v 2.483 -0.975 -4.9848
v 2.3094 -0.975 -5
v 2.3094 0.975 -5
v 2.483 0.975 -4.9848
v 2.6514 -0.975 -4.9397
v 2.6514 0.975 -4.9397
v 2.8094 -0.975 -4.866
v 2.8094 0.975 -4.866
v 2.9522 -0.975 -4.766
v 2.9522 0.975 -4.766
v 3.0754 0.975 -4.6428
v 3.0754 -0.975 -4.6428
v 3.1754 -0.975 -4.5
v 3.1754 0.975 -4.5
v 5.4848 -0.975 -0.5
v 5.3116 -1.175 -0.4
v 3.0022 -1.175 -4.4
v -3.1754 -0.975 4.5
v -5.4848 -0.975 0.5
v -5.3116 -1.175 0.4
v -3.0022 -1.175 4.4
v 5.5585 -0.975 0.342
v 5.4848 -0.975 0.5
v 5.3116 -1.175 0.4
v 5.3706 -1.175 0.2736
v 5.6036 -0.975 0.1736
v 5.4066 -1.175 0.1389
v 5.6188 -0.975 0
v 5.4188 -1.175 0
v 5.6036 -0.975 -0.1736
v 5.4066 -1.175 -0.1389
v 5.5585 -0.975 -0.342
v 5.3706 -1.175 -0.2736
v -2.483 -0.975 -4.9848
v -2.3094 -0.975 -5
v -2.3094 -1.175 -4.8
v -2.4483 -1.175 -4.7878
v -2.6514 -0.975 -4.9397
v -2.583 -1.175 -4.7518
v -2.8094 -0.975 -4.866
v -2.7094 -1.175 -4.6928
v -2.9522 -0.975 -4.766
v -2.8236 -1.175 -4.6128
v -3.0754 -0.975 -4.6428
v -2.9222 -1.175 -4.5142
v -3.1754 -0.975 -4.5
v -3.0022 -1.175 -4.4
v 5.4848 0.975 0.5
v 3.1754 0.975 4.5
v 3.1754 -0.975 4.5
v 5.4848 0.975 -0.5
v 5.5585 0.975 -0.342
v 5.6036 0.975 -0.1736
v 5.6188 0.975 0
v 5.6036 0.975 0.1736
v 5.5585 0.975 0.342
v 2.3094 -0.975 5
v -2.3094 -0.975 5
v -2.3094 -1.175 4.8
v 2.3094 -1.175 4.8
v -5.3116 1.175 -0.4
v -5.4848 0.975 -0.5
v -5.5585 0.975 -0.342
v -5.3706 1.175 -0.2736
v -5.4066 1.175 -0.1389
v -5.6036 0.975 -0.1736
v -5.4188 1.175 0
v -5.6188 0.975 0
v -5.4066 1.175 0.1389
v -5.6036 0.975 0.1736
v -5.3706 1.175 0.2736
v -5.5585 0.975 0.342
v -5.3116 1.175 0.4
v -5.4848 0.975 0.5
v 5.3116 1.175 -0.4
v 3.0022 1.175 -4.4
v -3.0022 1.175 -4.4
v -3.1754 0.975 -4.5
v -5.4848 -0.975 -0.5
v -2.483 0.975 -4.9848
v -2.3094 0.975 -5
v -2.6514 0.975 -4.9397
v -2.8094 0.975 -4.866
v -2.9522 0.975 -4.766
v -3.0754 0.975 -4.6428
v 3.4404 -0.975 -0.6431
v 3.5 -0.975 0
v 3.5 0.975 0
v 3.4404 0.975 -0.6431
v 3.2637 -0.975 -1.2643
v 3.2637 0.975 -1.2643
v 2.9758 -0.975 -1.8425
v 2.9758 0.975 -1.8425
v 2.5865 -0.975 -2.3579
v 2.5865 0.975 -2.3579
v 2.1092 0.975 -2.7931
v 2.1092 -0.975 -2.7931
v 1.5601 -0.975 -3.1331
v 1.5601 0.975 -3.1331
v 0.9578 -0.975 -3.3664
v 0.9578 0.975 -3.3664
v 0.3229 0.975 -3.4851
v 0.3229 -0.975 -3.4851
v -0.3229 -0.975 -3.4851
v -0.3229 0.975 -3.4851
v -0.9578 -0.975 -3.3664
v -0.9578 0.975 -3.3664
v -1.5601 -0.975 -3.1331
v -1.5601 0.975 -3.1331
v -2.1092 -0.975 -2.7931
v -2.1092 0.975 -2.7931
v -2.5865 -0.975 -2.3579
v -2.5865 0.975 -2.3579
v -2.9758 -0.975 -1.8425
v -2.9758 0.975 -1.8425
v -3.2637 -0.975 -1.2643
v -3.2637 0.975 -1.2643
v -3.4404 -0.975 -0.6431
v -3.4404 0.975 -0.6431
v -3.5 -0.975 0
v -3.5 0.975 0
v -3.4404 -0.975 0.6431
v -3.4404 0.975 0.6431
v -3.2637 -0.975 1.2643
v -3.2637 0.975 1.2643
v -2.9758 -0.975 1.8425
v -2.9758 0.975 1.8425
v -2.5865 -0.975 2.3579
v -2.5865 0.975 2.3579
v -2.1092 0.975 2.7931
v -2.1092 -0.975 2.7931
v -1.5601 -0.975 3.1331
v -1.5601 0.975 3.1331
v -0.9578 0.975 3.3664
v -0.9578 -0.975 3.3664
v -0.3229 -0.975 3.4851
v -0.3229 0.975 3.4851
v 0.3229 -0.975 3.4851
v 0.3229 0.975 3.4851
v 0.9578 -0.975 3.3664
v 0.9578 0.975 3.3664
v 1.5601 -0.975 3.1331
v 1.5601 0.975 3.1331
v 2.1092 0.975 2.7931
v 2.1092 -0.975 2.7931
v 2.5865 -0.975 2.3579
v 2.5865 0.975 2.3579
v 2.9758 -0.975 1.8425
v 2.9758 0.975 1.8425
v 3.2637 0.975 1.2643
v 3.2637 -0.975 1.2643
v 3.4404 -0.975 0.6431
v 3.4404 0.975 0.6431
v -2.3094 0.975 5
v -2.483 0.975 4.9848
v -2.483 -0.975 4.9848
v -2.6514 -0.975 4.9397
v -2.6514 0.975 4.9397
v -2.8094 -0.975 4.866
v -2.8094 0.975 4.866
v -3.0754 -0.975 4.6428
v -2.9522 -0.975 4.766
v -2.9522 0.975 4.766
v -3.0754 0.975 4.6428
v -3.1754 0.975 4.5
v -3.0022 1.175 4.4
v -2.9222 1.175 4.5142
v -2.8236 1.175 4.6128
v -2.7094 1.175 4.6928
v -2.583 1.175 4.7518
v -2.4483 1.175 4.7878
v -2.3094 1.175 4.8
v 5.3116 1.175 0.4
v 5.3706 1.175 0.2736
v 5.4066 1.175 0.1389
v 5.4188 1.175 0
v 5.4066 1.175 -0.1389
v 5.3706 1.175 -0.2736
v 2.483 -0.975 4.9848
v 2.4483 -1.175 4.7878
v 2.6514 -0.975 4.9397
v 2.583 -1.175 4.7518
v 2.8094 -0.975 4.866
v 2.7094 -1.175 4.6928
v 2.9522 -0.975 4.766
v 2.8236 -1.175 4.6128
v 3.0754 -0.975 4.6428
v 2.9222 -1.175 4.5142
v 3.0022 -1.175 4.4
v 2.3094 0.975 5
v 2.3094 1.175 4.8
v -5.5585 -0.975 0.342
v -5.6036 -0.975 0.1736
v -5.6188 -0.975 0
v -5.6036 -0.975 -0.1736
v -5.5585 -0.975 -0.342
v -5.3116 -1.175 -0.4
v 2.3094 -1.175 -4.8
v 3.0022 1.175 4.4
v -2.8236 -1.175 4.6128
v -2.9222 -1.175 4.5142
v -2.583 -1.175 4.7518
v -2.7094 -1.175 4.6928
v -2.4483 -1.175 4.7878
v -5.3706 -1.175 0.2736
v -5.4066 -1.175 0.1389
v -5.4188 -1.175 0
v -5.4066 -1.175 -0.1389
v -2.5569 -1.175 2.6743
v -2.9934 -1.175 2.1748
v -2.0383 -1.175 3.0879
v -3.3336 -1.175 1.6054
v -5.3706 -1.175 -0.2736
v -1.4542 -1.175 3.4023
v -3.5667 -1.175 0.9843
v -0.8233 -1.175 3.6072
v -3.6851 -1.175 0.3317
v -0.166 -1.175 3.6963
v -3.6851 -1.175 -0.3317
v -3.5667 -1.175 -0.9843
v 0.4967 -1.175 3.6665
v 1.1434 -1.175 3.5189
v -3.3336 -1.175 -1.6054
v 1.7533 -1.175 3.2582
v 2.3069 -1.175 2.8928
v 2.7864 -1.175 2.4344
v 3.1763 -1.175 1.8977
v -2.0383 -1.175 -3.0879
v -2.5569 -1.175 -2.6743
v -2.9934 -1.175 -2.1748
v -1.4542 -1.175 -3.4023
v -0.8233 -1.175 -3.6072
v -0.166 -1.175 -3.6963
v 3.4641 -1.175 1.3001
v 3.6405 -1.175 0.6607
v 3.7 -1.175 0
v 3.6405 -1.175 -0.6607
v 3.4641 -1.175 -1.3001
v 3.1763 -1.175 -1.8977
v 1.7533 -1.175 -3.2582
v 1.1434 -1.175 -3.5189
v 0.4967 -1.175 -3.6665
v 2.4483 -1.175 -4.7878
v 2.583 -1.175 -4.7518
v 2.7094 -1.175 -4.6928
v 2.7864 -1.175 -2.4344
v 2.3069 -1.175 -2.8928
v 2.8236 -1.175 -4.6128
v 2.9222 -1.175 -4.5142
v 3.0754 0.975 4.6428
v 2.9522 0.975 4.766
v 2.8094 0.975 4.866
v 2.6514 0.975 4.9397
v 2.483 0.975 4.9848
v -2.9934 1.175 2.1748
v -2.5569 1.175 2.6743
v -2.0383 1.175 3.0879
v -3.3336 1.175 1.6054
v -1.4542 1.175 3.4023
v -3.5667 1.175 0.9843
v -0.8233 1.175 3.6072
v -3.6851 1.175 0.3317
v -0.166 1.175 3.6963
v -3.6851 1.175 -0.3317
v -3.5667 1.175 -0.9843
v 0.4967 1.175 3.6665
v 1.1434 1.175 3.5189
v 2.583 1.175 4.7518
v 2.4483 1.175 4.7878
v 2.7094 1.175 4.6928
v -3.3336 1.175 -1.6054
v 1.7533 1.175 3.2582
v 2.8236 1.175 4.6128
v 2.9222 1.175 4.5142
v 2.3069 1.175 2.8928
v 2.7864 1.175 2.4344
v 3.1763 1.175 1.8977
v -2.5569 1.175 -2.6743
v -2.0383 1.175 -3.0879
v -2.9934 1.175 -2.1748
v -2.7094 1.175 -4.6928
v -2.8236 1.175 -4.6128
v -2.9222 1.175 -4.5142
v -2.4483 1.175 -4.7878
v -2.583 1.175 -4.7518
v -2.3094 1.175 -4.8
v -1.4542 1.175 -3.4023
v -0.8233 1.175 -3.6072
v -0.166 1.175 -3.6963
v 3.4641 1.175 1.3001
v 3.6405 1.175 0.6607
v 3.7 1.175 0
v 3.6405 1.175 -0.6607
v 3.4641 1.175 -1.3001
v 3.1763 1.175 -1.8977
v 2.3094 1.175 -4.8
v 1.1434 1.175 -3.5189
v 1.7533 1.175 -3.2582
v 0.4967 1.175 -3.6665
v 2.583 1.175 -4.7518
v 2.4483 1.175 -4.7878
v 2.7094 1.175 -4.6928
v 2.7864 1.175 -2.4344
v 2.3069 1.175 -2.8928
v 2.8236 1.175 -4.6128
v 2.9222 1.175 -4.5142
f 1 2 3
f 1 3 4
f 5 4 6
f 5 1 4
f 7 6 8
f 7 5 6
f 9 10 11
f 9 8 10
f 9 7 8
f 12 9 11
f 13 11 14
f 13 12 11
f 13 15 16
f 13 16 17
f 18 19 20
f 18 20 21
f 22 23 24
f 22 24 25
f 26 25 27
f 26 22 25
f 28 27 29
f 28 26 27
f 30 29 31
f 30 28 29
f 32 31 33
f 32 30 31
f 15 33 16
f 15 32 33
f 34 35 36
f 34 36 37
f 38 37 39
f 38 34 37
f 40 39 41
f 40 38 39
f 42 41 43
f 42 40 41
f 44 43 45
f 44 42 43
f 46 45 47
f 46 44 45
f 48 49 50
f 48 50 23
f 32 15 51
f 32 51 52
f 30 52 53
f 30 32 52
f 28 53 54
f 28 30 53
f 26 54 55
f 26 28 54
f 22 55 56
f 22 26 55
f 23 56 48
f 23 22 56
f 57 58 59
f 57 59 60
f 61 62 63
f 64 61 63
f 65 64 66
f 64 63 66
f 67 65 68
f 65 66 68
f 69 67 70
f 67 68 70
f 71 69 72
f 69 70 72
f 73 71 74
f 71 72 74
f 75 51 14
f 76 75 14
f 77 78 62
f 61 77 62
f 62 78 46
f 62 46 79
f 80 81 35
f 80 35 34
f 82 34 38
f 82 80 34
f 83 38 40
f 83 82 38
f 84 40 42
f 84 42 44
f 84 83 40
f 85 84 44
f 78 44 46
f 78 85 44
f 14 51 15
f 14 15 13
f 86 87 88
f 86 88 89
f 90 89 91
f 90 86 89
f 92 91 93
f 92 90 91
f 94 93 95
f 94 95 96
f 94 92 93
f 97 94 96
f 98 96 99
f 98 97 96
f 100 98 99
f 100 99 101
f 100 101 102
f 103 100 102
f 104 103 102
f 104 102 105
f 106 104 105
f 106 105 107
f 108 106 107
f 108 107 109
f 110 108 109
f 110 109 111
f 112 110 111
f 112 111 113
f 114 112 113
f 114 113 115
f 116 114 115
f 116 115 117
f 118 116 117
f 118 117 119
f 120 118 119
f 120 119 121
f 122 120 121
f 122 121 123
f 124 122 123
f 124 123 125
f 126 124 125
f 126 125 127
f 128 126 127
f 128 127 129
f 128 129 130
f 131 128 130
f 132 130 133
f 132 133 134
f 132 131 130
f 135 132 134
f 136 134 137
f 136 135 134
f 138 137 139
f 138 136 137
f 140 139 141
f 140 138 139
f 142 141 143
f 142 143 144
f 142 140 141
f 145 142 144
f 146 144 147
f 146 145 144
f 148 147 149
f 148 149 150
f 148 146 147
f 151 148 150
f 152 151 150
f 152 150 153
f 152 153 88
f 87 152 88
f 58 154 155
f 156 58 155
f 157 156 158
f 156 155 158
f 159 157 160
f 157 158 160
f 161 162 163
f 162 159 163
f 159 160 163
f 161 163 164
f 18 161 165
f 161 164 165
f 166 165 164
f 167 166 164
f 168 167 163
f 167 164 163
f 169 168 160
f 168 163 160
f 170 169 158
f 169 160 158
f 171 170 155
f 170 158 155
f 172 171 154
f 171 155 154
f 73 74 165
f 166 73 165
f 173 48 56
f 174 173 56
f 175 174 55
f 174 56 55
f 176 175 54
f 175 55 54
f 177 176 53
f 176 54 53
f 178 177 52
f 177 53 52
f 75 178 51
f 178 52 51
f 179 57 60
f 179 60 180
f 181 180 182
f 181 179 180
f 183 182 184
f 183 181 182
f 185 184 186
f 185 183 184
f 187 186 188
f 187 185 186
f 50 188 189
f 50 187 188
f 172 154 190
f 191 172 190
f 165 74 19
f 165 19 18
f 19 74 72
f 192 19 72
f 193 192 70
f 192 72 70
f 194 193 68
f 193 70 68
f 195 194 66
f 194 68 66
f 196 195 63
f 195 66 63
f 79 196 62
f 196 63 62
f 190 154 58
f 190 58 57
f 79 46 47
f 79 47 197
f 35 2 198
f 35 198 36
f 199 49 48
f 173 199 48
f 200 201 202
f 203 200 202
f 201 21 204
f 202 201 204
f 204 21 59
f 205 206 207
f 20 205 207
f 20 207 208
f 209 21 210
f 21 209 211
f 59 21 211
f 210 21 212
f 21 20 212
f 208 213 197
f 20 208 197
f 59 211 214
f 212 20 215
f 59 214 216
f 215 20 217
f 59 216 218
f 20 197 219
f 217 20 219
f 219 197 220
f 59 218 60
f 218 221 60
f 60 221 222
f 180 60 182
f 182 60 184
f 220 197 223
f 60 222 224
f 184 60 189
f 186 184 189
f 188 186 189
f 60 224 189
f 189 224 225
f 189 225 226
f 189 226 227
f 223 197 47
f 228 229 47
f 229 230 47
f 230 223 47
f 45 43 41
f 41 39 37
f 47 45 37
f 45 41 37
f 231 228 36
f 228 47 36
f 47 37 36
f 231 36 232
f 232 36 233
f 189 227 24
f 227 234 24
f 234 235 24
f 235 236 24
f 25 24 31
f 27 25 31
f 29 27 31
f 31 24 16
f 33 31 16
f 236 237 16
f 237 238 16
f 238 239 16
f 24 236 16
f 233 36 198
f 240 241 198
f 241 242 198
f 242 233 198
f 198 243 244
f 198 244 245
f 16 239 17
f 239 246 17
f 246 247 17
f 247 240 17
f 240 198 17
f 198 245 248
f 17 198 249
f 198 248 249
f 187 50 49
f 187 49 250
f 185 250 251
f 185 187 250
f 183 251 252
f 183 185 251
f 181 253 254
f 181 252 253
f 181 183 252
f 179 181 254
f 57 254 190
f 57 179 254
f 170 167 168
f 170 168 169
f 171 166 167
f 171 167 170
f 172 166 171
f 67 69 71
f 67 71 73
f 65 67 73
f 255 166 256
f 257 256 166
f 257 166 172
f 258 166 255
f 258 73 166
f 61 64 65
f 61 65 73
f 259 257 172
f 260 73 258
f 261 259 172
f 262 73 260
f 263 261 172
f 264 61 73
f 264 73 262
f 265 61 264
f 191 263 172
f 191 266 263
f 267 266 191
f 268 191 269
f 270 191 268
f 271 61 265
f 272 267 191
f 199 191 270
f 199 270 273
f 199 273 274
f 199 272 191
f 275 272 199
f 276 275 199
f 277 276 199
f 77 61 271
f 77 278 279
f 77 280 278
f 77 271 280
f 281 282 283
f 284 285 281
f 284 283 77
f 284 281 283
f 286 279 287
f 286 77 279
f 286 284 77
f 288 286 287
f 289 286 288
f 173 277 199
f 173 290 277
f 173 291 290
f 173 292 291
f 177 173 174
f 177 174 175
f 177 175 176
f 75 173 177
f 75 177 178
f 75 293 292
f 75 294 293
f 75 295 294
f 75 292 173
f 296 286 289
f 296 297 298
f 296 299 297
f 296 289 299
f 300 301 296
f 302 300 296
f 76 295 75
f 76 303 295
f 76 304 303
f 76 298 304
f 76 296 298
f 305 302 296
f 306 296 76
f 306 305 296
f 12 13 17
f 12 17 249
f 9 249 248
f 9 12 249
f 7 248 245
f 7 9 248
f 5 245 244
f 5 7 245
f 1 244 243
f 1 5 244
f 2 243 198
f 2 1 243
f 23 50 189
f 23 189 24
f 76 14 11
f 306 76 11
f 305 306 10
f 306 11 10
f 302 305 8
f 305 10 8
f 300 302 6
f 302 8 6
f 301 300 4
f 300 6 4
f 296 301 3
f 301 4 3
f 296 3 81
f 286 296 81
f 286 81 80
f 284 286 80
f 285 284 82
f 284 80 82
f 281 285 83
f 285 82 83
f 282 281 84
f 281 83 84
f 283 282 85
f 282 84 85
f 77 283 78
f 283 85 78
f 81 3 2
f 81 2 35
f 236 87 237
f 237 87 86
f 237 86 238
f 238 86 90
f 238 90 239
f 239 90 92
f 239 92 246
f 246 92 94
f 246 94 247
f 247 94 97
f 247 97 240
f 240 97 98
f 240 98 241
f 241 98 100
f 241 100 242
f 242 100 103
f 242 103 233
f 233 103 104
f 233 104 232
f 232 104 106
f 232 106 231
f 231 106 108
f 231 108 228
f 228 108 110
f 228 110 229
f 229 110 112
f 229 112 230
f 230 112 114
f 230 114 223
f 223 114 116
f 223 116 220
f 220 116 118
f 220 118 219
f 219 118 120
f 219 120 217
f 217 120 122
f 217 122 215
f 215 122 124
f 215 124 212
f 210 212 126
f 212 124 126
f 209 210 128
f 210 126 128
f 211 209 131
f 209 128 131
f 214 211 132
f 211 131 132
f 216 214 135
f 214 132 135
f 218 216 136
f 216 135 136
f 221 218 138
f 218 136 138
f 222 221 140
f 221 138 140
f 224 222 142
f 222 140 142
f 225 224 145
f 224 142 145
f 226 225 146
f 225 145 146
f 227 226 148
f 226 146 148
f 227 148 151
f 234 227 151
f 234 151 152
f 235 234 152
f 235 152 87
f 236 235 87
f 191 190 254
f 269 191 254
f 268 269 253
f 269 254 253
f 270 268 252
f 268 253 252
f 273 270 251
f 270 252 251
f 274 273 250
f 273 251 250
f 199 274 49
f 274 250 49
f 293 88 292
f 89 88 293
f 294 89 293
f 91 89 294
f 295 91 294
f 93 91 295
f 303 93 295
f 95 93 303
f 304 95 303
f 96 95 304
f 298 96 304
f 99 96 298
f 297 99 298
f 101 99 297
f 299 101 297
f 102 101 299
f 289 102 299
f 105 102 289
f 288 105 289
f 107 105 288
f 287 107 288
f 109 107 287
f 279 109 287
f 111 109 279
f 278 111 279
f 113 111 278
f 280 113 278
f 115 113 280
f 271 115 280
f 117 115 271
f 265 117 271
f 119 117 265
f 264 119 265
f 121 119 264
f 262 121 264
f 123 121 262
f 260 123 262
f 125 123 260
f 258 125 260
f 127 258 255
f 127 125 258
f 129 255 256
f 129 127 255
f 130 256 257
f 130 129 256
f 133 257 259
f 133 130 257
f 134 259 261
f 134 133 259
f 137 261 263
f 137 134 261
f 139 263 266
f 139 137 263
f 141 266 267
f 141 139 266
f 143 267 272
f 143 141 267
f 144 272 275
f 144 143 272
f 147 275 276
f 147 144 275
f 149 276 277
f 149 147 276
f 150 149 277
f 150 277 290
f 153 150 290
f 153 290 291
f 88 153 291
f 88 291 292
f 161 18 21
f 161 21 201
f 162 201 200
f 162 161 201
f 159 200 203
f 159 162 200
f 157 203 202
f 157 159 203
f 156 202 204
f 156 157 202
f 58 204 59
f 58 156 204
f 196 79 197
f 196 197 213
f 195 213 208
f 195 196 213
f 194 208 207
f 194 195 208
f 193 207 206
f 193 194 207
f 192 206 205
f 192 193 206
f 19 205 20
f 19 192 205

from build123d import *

# Parameters (mm, degrees)
SKETCH1_R           = 3.5
BOSS_EXTRUDE1_DEPTH = 1.175
FILLET1_R           = 1
CHAMFER1_SIZE       = 0.2


with BuildPart() as part:
    # Sketch1 → Boss-Extrude1 (new body, symmetric)
    with BuildSketch(Plane(origin=(0, 0, 0), x_dir=(1, 0, 0), z_dir=(0, 1, 0))):
        Polygon((2.886751346, 5), (-2.886751346, 5), (-5.773502692, 0), (-2.886751346, -5), (2.886751346, -5), (5.773502692, 0), align=None)
        Circle(SKETCH1_R, mode=Mode.SUBTRACT)
    extrude(amount=BOSS_EXTRUDE1_DEPTH, both=True)

    # Fillet1
    fillet1_edges = [part.edges().sort_by_distance(p)[0] for p in [
        (5.773502692, 0, 0),
        (2.886751346, 0, 5),
        (-2.886751346, 0, 5),
        (-5.773502692, 0, 0),
        (-2.886751346, 0, -5),
        (2.886751346, 0, -5),
    ]]
    fillet(fillet1_edges, radius=FILLET1_R)

    # Chamfer1
    chamfer1_edges = [part.edges().sort_by_distance(p)[0] for p in [
        (-3.5, -1.175, 0),
        (-3.5, 1.175, 0),
        (4.330127019, -1.175, -2.5),
        (4.330127019, 1.175, -2.5),
        (4.330127019, -1.175, 2.5),
        (0, -1.175, 5),
        (-4.330127019, -1.175, 2.5),
        (-4.330127019, -1.175, -2.5),
        (0, -1.175, -5),
        (-2.809401077, -1.175, 4.866025404),
        (2.809401077, -1.175, -4.866025404),
        (-2.809401077, -1.175, -4.866025404),
        (-5.618802154, -1.175, 0),
        (2.809401077, -1.175, 4.866025404),
        (5.618802154, -1.175, 0),
        (4.330127019, 1.175, 2.5),
        (0, 1.175, -5),
        (-4.330127019, 1.175, -2.5),
        (-4.330127019, 1.175, 2.5),
        (0, 1.175, 5),
        (-2.809401077, 1.175, 4.866025404),
        (2.809401077, 1.175, -4.866025404),
        (-2.809401077, 1.175, -4.866025404),
        (-5.618802154, 1.175, 0),
        (2.809401077, 1.175, 4.866025404),
        (5.618802154, 1.175, 0),
    ]]
    chamfer(chamfer1_edges, length=CHAMFER1_SIZE)


solid = part.part
